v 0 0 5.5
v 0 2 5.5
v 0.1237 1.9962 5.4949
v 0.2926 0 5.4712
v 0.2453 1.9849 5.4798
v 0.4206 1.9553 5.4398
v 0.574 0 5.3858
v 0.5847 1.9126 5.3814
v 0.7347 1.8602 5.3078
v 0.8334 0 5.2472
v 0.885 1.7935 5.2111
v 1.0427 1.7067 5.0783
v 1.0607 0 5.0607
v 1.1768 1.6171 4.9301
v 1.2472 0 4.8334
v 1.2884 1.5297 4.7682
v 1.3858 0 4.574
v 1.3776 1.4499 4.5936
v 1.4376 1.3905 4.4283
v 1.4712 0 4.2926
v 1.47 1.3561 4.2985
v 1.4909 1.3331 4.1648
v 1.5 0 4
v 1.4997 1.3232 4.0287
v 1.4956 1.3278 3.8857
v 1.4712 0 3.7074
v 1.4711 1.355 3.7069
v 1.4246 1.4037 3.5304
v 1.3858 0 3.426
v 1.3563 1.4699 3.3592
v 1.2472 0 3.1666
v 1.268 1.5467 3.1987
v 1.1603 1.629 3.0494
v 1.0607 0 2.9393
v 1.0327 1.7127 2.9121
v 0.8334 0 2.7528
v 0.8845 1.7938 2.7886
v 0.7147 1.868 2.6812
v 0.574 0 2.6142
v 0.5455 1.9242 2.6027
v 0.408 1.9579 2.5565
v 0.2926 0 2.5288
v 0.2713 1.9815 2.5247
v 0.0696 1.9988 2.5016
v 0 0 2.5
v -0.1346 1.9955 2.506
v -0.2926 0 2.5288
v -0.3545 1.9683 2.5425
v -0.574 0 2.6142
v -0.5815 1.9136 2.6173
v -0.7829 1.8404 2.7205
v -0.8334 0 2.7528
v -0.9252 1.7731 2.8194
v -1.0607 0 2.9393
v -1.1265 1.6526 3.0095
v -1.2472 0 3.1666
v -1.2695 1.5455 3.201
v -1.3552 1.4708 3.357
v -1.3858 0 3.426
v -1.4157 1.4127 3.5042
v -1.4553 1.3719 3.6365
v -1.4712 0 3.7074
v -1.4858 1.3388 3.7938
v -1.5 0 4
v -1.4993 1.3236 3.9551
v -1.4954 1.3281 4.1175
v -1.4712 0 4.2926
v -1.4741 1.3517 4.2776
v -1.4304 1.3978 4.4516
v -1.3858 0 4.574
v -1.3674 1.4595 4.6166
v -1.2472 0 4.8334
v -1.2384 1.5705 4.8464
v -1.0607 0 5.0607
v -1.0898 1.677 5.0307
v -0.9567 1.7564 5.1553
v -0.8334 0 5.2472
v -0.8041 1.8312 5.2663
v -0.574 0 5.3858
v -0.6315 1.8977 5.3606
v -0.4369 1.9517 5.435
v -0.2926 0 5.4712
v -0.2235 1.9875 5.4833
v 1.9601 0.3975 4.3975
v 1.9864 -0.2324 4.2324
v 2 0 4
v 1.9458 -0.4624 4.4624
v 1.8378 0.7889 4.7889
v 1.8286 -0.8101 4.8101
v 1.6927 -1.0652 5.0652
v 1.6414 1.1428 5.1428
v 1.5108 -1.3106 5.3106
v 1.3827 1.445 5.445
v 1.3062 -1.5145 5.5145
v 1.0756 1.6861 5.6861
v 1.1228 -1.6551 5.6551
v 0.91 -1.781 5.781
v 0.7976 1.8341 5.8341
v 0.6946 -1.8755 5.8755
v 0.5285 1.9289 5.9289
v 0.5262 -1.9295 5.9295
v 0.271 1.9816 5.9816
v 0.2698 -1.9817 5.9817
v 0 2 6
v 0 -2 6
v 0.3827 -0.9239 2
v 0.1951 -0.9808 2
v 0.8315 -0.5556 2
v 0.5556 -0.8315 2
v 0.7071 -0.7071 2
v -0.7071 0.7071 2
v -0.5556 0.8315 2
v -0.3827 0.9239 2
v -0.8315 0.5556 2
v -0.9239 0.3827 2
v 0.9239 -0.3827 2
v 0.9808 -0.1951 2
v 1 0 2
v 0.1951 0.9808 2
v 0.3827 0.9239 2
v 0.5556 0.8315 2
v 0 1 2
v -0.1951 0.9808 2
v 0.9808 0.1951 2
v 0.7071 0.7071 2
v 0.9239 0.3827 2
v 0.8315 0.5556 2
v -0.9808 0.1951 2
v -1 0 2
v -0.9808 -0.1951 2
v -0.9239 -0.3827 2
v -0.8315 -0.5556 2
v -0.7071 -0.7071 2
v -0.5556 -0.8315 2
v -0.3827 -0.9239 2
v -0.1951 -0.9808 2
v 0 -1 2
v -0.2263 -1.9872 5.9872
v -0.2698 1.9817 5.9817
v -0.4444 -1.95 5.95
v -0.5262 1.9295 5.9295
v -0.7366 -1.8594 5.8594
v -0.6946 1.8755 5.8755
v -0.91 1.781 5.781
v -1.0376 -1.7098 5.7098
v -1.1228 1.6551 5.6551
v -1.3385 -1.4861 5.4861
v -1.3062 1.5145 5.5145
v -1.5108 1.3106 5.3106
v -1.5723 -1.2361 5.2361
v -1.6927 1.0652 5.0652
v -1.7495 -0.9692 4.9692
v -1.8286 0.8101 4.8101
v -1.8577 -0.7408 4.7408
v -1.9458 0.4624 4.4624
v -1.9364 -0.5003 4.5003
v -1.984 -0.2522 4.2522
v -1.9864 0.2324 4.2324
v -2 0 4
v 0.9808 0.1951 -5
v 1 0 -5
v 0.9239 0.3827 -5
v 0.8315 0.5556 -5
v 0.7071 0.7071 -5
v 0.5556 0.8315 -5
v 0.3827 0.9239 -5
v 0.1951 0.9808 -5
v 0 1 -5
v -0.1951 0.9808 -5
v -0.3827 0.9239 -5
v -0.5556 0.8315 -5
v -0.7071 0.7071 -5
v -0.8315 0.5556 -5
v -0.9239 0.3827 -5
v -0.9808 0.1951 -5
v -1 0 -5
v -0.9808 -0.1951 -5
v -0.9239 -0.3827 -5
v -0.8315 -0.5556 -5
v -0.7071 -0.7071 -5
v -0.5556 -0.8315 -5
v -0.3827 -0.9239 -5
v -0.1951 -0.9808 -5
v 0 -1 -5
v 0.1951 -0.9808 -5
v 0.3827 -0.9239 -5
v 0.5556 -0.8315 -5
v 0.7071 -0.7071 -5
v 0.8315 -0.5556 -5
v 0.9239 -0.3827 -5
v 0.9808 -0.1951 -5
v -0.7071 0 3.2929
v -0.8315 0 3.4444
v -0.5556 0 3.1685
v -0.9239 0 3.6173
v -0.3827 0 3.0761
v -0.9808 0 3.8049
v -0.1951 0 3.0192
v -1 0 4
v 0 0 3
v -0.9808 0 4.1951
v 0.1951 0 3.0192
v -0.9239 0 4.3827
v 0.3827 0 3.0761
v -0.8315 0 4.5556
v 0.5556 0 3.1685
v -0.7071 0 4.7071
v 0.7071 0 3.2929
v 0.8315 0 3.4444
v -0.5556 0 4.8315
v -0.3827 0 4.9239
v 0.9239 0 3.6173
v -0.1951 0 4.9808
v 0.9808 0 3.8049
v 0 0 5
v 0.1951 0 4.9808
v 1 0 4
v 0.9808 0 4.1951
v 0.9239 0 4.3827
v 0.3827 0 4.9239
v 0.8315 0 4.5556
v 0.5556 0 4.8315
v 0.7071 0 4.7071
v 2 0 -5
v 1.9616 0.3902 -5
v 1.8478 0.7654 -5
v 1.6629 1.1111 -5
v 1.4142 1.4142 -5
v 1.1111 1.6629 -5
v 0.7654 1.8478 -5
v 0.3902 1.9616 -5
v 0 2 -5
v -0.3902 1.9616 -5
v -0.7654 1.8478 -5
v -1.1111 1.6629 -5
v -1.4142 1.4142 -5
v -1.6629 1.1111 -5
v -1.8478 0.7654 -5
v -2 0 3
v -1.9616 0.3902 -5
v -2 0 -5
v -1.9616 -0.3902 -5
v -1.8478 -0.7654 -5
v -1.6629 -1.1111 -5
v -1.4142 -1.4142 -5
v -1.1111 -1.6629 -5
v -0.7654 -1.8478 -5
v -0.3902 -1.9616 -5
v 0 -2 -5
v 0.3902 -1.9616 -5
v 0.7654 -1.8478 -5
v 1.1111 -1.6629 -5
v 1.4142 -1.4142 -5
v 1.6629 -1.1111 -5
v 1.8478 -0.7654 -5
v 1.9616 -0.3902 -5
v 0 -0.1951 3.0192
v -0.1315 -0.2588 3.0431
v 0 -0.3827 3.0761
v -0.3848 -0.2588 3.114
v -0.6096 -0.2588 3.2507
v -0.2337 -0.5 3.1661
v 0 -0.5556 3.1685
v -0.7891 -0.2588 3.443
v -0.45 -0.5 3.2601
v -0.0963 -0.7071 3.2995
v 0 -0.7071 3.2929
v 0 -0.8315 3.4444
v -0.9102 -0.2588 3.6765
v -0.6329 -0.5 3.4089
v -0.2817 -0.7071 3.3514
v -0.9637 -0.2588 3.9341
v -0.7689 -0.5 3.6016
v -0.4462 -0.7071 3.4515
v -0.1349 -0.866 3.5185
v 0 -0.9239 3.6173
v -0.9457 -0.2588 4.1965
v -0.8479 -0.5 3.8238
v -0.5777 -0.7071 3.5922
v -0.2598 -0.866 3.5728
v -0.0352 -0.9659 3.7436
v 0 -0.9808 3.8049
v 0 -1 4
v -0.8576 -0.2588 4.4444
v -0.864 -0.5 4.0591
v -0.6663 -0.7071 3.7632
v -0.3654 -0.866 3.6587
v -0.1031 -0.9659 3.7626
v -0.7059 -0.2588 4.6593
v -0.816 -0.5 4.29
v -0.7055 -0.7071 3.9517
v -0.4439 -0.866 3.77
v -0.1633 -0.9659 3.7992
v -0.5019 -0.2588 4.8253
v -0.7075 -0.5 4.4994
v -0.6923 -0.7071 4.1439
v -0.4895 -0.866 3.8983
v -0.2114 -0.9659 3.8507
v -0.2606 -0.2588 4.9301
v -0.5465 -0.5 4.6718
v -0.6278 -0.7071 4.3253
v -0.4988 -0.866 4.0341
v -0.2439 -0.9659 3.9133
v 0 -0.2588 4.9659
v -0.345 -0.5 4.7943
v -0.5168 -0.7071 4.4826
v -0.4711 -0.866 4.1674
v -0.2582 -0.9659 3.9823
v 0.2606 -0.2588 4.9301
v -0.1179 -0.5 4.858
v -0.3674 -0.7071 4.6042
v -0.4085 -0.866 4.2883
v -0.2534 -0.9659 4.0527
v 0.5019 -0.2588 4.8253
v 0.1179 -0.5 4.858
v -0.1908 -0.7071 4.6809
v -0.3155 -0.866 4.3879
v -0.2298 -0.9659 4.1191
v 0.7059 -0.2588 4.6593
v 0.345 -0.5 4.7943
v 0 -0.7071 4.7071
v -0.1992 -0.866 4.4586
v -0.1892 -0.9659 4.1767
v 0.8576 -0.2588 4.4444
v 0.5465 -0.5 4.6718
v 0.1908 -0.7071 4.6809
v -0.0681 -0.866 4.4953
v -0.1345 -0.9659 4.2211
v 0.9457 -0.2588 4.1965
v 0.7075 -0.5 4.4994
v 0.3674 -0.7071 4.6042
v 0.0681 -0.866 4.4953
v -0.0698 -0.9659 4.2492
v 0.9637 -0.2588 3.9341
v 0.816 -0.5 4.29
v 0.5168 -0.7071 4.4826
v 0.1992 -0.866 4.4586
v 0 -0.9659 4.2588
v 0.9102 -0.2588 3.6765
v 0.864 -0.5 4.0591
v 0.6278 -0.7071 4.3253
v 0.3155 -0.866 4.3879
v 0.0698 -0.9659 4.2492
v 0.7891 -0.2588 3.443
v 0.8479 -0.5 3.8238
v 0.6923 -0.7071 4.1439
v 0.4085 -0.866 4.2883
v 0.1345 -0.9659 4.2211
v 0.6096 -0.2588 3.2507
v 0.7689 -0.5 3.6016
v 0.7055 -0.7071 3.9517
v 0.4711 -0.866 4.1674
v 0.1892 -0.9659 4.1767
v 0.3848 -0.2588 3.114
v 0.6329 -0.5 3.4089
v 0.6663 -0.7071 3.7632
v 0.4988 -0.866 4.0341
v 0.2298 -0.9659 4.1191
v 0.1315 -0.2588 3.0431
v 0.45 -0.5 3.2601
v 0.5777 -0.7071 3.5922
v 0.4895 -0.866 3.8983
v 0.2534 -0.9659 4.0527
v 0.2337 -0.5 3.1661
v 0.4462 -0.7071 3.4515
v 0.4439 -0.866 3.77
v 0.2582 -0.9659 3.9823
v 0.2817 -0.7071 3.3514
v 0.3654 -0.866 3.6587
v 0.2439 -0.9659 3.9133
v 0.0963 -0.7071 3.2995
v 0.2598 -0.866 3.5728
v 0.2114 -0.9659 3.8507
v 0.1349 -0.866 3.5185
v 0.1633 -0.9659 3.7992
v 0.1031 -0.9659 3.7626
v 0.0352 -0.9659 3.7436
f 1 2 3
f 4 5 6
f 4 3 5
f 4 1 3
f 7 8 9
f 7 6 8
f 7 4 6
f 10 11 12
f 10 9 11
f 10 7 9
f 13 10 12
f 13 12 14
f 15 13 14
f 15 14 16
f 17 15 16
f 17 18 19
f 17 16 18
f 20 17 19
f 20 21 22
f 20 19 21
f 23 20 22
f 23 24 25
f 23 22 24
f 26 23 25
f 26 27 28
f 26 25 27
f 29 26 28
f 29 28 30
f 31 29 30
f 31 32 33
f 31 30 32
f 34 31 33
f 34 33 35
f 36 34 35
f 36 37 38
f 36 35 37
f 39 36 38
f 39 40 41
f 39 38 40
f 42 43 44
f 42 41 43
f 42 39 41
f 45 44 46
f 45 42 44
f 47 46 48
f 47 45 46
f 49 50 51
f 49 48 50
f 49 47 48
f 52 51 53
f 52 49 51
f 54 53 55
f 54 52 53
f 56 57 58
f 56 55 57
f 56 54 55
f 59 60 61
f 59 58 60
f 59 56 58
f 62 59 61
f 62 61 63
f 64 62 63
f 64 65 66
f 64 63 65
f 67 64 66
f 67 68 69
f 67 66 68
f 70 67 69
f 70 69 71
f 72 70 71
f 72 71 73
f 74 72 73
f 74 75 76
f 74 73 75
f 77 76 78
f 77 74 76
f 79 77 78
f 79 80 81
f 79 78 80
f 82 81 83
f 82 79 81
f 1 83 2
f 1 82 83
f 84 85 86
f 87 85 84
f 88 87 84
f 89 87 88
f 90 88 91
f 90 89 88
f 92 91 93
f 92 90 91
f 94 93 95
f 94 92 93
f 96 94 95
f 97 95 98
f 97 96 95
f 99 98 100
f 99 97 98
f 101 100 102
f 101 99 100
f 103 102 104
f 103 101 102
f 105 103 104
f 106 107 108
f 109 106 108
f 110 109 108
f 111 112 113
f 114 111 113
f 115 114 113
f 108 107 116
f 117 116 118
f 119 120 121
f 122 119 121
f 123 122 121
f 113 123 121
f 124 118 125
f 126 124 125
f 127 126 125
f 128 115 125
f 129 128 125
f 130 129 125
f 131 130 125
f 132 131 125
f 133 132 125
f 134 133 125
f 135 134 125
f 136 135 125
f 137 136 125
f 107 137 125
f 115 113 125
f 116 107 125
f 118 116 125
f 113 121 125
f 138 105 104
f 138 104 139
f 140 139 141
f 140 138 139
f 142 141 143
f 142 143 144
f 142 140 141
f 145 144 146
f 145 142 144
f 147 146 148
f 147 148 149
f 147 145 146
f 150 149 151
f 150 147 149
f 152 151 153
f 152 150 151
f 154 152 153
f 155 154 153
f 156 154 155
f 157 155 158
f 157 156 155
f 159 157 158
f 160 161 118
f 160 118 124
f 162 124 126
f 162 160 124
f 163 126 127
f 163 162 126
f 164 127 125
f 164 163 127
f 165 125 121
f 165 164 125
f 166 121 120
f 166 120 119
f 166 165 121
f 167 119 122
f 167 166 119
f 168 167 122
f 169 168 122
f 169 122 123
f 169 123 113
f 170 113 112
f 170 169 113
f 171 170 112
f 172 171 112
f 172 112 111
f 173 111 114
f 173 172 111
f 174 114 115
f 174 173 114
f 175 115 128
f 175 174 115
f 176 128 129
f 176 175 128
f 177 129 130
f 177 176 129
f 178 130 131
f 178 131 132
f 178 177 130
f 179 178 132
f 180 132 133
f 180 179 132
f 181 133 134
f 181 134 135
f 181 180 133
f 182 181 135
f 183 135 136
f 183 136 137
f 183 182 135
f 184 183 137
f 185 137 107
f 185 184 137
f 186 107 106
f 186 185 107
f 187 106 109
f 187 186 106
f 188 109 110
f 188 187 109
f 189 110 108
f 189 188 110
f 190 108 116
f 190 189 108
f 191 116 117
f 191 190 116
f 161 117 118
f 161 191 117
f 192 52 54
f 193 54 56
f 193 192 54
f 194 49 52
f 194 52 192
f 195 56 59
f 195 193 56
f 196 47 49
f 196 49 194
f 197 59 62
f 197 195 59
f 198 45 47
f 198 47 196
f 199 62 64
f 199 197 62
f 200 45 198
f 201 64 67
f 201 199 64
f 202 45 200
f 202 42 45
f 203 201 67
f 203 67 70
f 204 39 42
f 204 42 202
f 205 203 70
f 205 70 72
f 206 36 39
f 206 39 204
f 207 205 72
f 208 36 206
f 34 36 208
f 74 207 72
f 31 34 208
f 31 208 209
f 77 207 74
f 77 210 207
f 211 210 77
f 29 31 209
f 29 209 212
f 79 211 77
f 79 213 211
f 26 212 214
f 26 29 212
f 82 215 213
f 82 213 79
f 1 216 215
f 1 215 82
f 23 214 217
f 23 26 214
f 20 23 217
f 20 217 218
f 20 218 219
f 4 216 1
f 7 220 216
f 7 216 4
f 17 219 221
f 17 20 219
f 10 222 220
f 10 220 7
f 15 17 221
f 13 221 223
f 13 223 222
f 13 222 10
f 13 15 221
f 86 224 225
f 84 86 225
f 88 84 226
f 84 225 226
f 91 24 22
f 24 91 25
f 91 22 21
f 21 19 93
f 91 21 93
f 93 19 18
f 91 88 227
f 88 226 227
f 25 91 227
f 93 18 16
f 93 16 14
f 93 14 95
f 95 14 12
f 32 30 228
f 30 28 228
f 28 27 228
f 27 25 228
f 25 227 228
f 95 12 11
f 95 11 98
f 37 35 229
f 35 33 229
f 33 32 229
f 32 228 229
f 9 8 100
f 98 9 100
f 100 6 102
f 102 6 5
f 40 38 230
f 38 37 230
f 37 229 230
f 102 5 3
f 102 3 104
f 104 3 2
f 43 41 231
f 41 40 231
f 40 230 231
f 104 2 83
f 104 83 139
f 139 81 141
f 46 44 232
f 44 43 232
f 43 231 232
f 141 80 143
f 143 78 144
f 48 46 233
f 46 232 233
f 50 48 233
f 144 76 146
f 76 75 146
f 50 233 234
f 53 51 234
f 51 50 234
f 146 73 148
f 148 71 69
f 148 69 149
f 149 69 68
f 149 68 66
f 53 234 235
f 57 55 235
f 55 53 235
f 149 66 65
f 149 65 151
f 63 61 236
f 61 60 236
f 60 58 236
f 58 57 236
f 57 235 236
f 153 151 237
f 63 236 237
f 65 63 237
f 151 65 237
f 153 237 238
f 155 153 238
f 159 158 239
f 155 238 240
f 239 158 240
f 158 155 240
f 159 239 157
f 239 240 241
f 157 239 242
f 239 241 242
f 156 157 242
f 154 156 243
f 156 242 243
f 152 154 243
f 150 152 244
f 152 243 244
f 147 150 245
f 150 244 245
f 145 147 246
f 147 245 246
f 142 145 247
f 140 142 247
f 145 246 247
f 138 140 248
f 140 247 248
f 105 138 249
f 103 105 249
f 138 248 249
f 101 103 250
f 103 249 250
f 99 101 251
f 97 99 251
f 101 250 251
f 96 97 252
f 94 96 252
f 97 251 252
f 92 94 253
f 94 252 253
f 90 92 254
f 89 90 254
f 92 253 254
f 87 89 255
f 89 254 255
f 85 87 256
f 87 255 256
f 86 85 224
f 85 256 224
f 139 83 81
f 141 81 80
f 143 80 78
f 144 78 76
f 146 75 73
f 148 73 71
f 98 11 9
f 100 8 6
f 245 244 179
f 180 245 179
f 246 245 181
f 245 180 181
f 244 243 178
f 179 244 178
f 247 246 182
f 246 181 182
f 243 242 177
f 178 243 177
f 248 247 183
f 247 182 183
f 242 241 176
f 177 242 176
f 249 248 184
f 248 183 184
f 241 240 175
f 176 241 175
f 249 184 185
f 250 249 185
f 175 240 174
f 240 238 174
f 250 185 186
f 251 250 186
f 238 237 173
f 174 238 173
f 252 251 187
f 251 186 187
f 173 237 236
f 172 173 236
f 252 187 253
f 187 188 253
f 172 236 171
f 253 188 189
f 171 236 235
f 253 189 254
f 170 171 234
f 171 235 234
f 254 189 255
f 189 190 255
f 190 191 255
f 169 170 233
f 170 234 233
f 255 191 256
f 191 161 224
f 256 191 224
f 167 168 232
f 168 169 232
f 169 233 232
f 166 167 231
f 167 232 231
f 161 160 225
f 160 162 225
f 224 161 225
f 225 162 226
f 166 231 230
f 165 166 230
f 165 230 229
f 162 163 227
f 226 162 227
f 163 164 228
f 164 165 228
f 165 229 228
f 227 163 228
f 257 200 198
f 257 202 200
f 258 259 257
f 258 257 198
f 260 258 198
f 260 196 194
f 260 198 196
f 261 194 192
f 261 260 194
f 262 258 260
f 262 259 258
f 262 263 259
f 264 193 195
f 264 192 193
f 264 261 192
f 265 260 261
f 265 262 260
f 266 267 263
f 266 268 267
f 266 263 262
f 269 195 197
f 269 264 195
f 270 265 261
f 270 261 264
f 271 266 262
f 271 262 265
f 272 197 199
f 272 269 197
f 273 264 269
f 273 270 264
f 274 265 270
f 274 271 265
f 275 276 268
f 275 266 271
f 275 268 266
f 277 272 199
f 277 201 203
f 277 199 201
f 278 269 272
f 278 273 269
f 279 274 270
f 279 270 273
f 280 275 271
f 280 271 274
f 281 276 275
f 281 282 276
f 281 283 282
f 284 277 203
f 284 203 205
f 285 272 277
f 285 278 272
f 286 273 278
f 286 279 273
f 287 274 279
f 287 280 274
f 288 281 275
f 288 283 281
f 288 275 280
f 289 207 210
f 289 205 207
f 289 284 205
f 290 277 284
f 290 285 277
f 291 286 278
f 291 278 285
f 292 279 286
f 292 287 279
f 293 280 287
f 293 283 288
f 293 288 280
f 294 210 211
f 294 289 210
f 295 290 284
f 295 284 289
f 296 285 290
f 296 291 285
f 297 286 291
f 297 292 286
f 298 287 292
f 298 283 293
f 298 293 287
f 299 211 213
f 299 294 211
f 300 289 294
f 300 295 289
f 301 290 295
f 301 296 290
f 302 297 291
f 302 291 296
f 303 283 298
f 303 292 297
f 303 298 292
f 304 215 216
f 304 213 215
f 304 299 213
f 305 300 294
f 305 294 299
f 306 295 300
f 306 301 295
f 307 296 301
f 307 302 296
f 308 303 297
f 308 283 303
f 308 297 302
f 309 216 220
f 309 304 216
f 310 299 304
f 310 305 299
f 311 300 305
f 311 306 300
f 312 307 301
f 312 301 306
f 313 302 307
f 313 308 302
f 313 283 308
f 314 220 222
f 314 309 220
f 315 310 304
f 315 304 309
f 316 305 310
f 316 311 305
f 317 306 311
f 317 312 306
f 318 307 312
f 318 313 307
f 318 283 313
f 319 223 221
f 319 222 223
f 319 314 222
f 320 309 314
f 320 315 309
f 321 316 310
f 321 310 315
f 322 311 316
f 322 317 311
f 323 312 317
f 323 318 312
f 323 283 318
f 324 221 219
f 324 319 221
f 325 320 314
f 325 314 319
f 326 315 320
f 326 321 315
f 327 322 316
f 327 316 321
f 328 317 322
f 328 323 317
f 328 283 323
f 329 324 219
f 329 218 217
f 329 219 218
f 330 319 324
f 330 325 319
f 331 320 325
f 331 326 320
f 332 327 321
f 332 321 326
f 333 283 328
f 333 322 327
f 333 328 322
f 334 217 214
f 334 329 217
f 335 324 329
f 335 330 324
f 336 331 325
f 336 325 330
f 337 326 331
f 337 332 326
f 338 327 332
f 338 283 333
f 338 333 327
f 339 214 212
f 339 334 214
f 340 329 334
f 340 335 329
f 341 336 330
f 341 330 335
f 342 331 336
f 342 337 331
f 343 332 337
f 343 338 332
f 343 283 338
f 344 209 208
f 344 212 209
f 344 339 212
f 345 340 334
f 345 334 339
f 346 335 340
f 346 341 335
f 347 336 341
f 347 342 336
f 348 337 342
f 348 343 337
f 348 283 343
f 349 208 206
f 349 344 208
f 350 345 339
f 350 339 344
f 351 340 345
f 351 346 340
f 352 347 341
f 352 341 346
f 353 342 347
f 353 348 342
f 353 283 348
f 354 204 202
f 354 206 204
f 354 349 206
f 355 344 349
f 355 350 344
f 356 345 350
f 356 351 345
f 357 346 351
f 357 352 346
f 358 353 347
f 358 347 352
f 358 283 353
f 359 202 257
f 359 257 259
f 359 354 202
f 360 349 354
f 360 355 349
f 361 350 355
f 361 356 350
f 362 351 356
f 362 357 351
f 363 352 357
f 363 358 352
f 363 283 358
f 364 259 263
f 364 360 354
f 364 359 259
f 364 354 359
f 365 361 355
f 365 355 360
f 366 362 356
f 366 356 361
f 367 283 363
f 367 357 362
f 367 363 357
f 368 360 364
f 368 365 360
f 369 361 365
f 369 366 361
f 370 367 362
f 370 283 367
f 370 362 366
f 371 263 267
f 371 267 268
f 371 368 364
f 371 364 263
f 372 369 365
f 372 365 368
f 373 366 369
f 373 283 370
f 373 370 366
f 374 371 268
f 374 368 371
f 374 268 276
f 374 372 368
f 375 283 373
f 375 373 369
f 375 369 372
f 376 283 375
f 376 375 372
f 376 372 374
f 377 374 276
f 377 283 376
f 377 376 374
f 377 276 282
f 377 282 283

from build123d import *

# Parameters (mm, degrees)
BOSS_EXTRU_1_DEPTH       = 2
BOSS_EXTRU_1_DEPTH_BACK  = 5
ESQUISSE1_R              = 2
ESQUISSE1_R_2            = 1
BOSS_EXTRU_2_START       = 2
BOSS_EXTRU_2_OUTLINE_R   = 2
BOSS_EXTRU_2_DEPTH       = 2
BOSS_EXTRU_2_START_2     = 4
BOSS_EXTRU_2_2_OUTLINE_R = 2
BOSS_EXTRU_2_2_DEPTH     = 2
BOSS_EXTRU_2_START_3     = -3
BOSS_EXTRU_2_3_DEPTH     = 6
ENL_V_START              = -2
ESQUISSE4_R              = 1.5
ENL_V_MAT_EXTRU_1_DEPTH  = 2


with BuildPart() as part:
    # Esquisse1 → Boss.-Extru.1 (new, two sides: drawn at the far end of the back side and taken through both)
    with BuildSketch(Plane.XY.offset(-BOSS_EXTRU_1_DEPTH_BACK)):
        Circle(ESQUISSE1_R)
        Circle(ESQUISSE1_R_2, mode=Mode.SUBTRACT)
    extrude(amount=BOSS_EXTRU_1_DEPTH + BOSS_EXTRU_1_DEPTH_BACK)

    # Boss.-Extru.2: read off the stored shape, not the designer's step
    # Boss.-Extru.2 outline → Boss.-Extru.2 (add)
    with BuildSketch(Plane.XY.offset(BOSS_EXTRU_2_START)):
        Circle(BOSS_EXTRU_2_OUTLINE_R)
    extrude(amount=BOSS_EXTRU_2_DEPTH)

    # Boss.-Extru.2 2 outline → Boss.-Extru.2 2 (add)
    with BuildSketch(Plane.XY.offset(BOSS_EXTRU_2_START_2)):
        Circle(BOSS_EXTRU_2_2_OUTLINE_R)
    extrude(amount=BOSS_EXTRU_2_2_DEPTH)

    # Boss.-Extru.2 3 outline → Boss.-Extru.2 3 (cut)
    with BuildSketch(Plane(origin=(0, 0, 0), x_dir=(1, 0, 0), z_dir=(0, 1, 0)).offset(BOSS_EXTRU_2_START_3)):
        with BuildLine():
            Line((2, -3), (2, -4))
            ThreePointArc((2, -4), (1.414213562, -5.414213562), (0, -6))
            Line((0, -6), (3, -6))
            Line((3, -6), (3, -3))
            Line((3, -3), (2, -3))
        make_face()
        with BuildLine():
            Line((-3, -6), (0, -6))
            ThreePointArc((0, -6), (-1.414213562, -5.414213562), (-2, -4))
            Line((-2, -4), (-2, -3))
            Line((-2, -3), (-3, -3))
            Line((-3, -3), (-3, -6))
        make_face()
    extrude(amount=BOSS_EXTRU_2_3_DEPTH, mode=Mode.SUBTRACT)

    # Esquisse3 → Enlèvement de matière-Révolution1 (revolve, cut)
    with BuildSketch(Plane(origin=(0, 0, 0), x_dir=(0, 0, -1), z_dir=(1, 0, 0))):
        with BuildLine():
            Line((-4, -1), (-4, 1))
            ThreePointArc((-4, 1), (-3, 0), (-4, -1))
        make_face()
    revolve(axis=Axis((0, -1, 4), (0, 1, 0)), mode=Mode.SUBTRACT)

    # Esquisse4 → Enlèv. mat.-Extru.1 (cut)
    with BuildSketch(Plane(origin=(0, 2, 0), x_dir=(1, 0, 0), z_dir=(0, 1, 0)).offset(ENL_V_START)):
        with Locations(Location((0, -4, 0), (0, 0, 270))):
            Circle(ESQUISSE4_R)
    extrude(amount=ENL_V_MAT_EXTRU_1_DEPTH, mode=Mode.SUBTRACT)


solid = part.part
